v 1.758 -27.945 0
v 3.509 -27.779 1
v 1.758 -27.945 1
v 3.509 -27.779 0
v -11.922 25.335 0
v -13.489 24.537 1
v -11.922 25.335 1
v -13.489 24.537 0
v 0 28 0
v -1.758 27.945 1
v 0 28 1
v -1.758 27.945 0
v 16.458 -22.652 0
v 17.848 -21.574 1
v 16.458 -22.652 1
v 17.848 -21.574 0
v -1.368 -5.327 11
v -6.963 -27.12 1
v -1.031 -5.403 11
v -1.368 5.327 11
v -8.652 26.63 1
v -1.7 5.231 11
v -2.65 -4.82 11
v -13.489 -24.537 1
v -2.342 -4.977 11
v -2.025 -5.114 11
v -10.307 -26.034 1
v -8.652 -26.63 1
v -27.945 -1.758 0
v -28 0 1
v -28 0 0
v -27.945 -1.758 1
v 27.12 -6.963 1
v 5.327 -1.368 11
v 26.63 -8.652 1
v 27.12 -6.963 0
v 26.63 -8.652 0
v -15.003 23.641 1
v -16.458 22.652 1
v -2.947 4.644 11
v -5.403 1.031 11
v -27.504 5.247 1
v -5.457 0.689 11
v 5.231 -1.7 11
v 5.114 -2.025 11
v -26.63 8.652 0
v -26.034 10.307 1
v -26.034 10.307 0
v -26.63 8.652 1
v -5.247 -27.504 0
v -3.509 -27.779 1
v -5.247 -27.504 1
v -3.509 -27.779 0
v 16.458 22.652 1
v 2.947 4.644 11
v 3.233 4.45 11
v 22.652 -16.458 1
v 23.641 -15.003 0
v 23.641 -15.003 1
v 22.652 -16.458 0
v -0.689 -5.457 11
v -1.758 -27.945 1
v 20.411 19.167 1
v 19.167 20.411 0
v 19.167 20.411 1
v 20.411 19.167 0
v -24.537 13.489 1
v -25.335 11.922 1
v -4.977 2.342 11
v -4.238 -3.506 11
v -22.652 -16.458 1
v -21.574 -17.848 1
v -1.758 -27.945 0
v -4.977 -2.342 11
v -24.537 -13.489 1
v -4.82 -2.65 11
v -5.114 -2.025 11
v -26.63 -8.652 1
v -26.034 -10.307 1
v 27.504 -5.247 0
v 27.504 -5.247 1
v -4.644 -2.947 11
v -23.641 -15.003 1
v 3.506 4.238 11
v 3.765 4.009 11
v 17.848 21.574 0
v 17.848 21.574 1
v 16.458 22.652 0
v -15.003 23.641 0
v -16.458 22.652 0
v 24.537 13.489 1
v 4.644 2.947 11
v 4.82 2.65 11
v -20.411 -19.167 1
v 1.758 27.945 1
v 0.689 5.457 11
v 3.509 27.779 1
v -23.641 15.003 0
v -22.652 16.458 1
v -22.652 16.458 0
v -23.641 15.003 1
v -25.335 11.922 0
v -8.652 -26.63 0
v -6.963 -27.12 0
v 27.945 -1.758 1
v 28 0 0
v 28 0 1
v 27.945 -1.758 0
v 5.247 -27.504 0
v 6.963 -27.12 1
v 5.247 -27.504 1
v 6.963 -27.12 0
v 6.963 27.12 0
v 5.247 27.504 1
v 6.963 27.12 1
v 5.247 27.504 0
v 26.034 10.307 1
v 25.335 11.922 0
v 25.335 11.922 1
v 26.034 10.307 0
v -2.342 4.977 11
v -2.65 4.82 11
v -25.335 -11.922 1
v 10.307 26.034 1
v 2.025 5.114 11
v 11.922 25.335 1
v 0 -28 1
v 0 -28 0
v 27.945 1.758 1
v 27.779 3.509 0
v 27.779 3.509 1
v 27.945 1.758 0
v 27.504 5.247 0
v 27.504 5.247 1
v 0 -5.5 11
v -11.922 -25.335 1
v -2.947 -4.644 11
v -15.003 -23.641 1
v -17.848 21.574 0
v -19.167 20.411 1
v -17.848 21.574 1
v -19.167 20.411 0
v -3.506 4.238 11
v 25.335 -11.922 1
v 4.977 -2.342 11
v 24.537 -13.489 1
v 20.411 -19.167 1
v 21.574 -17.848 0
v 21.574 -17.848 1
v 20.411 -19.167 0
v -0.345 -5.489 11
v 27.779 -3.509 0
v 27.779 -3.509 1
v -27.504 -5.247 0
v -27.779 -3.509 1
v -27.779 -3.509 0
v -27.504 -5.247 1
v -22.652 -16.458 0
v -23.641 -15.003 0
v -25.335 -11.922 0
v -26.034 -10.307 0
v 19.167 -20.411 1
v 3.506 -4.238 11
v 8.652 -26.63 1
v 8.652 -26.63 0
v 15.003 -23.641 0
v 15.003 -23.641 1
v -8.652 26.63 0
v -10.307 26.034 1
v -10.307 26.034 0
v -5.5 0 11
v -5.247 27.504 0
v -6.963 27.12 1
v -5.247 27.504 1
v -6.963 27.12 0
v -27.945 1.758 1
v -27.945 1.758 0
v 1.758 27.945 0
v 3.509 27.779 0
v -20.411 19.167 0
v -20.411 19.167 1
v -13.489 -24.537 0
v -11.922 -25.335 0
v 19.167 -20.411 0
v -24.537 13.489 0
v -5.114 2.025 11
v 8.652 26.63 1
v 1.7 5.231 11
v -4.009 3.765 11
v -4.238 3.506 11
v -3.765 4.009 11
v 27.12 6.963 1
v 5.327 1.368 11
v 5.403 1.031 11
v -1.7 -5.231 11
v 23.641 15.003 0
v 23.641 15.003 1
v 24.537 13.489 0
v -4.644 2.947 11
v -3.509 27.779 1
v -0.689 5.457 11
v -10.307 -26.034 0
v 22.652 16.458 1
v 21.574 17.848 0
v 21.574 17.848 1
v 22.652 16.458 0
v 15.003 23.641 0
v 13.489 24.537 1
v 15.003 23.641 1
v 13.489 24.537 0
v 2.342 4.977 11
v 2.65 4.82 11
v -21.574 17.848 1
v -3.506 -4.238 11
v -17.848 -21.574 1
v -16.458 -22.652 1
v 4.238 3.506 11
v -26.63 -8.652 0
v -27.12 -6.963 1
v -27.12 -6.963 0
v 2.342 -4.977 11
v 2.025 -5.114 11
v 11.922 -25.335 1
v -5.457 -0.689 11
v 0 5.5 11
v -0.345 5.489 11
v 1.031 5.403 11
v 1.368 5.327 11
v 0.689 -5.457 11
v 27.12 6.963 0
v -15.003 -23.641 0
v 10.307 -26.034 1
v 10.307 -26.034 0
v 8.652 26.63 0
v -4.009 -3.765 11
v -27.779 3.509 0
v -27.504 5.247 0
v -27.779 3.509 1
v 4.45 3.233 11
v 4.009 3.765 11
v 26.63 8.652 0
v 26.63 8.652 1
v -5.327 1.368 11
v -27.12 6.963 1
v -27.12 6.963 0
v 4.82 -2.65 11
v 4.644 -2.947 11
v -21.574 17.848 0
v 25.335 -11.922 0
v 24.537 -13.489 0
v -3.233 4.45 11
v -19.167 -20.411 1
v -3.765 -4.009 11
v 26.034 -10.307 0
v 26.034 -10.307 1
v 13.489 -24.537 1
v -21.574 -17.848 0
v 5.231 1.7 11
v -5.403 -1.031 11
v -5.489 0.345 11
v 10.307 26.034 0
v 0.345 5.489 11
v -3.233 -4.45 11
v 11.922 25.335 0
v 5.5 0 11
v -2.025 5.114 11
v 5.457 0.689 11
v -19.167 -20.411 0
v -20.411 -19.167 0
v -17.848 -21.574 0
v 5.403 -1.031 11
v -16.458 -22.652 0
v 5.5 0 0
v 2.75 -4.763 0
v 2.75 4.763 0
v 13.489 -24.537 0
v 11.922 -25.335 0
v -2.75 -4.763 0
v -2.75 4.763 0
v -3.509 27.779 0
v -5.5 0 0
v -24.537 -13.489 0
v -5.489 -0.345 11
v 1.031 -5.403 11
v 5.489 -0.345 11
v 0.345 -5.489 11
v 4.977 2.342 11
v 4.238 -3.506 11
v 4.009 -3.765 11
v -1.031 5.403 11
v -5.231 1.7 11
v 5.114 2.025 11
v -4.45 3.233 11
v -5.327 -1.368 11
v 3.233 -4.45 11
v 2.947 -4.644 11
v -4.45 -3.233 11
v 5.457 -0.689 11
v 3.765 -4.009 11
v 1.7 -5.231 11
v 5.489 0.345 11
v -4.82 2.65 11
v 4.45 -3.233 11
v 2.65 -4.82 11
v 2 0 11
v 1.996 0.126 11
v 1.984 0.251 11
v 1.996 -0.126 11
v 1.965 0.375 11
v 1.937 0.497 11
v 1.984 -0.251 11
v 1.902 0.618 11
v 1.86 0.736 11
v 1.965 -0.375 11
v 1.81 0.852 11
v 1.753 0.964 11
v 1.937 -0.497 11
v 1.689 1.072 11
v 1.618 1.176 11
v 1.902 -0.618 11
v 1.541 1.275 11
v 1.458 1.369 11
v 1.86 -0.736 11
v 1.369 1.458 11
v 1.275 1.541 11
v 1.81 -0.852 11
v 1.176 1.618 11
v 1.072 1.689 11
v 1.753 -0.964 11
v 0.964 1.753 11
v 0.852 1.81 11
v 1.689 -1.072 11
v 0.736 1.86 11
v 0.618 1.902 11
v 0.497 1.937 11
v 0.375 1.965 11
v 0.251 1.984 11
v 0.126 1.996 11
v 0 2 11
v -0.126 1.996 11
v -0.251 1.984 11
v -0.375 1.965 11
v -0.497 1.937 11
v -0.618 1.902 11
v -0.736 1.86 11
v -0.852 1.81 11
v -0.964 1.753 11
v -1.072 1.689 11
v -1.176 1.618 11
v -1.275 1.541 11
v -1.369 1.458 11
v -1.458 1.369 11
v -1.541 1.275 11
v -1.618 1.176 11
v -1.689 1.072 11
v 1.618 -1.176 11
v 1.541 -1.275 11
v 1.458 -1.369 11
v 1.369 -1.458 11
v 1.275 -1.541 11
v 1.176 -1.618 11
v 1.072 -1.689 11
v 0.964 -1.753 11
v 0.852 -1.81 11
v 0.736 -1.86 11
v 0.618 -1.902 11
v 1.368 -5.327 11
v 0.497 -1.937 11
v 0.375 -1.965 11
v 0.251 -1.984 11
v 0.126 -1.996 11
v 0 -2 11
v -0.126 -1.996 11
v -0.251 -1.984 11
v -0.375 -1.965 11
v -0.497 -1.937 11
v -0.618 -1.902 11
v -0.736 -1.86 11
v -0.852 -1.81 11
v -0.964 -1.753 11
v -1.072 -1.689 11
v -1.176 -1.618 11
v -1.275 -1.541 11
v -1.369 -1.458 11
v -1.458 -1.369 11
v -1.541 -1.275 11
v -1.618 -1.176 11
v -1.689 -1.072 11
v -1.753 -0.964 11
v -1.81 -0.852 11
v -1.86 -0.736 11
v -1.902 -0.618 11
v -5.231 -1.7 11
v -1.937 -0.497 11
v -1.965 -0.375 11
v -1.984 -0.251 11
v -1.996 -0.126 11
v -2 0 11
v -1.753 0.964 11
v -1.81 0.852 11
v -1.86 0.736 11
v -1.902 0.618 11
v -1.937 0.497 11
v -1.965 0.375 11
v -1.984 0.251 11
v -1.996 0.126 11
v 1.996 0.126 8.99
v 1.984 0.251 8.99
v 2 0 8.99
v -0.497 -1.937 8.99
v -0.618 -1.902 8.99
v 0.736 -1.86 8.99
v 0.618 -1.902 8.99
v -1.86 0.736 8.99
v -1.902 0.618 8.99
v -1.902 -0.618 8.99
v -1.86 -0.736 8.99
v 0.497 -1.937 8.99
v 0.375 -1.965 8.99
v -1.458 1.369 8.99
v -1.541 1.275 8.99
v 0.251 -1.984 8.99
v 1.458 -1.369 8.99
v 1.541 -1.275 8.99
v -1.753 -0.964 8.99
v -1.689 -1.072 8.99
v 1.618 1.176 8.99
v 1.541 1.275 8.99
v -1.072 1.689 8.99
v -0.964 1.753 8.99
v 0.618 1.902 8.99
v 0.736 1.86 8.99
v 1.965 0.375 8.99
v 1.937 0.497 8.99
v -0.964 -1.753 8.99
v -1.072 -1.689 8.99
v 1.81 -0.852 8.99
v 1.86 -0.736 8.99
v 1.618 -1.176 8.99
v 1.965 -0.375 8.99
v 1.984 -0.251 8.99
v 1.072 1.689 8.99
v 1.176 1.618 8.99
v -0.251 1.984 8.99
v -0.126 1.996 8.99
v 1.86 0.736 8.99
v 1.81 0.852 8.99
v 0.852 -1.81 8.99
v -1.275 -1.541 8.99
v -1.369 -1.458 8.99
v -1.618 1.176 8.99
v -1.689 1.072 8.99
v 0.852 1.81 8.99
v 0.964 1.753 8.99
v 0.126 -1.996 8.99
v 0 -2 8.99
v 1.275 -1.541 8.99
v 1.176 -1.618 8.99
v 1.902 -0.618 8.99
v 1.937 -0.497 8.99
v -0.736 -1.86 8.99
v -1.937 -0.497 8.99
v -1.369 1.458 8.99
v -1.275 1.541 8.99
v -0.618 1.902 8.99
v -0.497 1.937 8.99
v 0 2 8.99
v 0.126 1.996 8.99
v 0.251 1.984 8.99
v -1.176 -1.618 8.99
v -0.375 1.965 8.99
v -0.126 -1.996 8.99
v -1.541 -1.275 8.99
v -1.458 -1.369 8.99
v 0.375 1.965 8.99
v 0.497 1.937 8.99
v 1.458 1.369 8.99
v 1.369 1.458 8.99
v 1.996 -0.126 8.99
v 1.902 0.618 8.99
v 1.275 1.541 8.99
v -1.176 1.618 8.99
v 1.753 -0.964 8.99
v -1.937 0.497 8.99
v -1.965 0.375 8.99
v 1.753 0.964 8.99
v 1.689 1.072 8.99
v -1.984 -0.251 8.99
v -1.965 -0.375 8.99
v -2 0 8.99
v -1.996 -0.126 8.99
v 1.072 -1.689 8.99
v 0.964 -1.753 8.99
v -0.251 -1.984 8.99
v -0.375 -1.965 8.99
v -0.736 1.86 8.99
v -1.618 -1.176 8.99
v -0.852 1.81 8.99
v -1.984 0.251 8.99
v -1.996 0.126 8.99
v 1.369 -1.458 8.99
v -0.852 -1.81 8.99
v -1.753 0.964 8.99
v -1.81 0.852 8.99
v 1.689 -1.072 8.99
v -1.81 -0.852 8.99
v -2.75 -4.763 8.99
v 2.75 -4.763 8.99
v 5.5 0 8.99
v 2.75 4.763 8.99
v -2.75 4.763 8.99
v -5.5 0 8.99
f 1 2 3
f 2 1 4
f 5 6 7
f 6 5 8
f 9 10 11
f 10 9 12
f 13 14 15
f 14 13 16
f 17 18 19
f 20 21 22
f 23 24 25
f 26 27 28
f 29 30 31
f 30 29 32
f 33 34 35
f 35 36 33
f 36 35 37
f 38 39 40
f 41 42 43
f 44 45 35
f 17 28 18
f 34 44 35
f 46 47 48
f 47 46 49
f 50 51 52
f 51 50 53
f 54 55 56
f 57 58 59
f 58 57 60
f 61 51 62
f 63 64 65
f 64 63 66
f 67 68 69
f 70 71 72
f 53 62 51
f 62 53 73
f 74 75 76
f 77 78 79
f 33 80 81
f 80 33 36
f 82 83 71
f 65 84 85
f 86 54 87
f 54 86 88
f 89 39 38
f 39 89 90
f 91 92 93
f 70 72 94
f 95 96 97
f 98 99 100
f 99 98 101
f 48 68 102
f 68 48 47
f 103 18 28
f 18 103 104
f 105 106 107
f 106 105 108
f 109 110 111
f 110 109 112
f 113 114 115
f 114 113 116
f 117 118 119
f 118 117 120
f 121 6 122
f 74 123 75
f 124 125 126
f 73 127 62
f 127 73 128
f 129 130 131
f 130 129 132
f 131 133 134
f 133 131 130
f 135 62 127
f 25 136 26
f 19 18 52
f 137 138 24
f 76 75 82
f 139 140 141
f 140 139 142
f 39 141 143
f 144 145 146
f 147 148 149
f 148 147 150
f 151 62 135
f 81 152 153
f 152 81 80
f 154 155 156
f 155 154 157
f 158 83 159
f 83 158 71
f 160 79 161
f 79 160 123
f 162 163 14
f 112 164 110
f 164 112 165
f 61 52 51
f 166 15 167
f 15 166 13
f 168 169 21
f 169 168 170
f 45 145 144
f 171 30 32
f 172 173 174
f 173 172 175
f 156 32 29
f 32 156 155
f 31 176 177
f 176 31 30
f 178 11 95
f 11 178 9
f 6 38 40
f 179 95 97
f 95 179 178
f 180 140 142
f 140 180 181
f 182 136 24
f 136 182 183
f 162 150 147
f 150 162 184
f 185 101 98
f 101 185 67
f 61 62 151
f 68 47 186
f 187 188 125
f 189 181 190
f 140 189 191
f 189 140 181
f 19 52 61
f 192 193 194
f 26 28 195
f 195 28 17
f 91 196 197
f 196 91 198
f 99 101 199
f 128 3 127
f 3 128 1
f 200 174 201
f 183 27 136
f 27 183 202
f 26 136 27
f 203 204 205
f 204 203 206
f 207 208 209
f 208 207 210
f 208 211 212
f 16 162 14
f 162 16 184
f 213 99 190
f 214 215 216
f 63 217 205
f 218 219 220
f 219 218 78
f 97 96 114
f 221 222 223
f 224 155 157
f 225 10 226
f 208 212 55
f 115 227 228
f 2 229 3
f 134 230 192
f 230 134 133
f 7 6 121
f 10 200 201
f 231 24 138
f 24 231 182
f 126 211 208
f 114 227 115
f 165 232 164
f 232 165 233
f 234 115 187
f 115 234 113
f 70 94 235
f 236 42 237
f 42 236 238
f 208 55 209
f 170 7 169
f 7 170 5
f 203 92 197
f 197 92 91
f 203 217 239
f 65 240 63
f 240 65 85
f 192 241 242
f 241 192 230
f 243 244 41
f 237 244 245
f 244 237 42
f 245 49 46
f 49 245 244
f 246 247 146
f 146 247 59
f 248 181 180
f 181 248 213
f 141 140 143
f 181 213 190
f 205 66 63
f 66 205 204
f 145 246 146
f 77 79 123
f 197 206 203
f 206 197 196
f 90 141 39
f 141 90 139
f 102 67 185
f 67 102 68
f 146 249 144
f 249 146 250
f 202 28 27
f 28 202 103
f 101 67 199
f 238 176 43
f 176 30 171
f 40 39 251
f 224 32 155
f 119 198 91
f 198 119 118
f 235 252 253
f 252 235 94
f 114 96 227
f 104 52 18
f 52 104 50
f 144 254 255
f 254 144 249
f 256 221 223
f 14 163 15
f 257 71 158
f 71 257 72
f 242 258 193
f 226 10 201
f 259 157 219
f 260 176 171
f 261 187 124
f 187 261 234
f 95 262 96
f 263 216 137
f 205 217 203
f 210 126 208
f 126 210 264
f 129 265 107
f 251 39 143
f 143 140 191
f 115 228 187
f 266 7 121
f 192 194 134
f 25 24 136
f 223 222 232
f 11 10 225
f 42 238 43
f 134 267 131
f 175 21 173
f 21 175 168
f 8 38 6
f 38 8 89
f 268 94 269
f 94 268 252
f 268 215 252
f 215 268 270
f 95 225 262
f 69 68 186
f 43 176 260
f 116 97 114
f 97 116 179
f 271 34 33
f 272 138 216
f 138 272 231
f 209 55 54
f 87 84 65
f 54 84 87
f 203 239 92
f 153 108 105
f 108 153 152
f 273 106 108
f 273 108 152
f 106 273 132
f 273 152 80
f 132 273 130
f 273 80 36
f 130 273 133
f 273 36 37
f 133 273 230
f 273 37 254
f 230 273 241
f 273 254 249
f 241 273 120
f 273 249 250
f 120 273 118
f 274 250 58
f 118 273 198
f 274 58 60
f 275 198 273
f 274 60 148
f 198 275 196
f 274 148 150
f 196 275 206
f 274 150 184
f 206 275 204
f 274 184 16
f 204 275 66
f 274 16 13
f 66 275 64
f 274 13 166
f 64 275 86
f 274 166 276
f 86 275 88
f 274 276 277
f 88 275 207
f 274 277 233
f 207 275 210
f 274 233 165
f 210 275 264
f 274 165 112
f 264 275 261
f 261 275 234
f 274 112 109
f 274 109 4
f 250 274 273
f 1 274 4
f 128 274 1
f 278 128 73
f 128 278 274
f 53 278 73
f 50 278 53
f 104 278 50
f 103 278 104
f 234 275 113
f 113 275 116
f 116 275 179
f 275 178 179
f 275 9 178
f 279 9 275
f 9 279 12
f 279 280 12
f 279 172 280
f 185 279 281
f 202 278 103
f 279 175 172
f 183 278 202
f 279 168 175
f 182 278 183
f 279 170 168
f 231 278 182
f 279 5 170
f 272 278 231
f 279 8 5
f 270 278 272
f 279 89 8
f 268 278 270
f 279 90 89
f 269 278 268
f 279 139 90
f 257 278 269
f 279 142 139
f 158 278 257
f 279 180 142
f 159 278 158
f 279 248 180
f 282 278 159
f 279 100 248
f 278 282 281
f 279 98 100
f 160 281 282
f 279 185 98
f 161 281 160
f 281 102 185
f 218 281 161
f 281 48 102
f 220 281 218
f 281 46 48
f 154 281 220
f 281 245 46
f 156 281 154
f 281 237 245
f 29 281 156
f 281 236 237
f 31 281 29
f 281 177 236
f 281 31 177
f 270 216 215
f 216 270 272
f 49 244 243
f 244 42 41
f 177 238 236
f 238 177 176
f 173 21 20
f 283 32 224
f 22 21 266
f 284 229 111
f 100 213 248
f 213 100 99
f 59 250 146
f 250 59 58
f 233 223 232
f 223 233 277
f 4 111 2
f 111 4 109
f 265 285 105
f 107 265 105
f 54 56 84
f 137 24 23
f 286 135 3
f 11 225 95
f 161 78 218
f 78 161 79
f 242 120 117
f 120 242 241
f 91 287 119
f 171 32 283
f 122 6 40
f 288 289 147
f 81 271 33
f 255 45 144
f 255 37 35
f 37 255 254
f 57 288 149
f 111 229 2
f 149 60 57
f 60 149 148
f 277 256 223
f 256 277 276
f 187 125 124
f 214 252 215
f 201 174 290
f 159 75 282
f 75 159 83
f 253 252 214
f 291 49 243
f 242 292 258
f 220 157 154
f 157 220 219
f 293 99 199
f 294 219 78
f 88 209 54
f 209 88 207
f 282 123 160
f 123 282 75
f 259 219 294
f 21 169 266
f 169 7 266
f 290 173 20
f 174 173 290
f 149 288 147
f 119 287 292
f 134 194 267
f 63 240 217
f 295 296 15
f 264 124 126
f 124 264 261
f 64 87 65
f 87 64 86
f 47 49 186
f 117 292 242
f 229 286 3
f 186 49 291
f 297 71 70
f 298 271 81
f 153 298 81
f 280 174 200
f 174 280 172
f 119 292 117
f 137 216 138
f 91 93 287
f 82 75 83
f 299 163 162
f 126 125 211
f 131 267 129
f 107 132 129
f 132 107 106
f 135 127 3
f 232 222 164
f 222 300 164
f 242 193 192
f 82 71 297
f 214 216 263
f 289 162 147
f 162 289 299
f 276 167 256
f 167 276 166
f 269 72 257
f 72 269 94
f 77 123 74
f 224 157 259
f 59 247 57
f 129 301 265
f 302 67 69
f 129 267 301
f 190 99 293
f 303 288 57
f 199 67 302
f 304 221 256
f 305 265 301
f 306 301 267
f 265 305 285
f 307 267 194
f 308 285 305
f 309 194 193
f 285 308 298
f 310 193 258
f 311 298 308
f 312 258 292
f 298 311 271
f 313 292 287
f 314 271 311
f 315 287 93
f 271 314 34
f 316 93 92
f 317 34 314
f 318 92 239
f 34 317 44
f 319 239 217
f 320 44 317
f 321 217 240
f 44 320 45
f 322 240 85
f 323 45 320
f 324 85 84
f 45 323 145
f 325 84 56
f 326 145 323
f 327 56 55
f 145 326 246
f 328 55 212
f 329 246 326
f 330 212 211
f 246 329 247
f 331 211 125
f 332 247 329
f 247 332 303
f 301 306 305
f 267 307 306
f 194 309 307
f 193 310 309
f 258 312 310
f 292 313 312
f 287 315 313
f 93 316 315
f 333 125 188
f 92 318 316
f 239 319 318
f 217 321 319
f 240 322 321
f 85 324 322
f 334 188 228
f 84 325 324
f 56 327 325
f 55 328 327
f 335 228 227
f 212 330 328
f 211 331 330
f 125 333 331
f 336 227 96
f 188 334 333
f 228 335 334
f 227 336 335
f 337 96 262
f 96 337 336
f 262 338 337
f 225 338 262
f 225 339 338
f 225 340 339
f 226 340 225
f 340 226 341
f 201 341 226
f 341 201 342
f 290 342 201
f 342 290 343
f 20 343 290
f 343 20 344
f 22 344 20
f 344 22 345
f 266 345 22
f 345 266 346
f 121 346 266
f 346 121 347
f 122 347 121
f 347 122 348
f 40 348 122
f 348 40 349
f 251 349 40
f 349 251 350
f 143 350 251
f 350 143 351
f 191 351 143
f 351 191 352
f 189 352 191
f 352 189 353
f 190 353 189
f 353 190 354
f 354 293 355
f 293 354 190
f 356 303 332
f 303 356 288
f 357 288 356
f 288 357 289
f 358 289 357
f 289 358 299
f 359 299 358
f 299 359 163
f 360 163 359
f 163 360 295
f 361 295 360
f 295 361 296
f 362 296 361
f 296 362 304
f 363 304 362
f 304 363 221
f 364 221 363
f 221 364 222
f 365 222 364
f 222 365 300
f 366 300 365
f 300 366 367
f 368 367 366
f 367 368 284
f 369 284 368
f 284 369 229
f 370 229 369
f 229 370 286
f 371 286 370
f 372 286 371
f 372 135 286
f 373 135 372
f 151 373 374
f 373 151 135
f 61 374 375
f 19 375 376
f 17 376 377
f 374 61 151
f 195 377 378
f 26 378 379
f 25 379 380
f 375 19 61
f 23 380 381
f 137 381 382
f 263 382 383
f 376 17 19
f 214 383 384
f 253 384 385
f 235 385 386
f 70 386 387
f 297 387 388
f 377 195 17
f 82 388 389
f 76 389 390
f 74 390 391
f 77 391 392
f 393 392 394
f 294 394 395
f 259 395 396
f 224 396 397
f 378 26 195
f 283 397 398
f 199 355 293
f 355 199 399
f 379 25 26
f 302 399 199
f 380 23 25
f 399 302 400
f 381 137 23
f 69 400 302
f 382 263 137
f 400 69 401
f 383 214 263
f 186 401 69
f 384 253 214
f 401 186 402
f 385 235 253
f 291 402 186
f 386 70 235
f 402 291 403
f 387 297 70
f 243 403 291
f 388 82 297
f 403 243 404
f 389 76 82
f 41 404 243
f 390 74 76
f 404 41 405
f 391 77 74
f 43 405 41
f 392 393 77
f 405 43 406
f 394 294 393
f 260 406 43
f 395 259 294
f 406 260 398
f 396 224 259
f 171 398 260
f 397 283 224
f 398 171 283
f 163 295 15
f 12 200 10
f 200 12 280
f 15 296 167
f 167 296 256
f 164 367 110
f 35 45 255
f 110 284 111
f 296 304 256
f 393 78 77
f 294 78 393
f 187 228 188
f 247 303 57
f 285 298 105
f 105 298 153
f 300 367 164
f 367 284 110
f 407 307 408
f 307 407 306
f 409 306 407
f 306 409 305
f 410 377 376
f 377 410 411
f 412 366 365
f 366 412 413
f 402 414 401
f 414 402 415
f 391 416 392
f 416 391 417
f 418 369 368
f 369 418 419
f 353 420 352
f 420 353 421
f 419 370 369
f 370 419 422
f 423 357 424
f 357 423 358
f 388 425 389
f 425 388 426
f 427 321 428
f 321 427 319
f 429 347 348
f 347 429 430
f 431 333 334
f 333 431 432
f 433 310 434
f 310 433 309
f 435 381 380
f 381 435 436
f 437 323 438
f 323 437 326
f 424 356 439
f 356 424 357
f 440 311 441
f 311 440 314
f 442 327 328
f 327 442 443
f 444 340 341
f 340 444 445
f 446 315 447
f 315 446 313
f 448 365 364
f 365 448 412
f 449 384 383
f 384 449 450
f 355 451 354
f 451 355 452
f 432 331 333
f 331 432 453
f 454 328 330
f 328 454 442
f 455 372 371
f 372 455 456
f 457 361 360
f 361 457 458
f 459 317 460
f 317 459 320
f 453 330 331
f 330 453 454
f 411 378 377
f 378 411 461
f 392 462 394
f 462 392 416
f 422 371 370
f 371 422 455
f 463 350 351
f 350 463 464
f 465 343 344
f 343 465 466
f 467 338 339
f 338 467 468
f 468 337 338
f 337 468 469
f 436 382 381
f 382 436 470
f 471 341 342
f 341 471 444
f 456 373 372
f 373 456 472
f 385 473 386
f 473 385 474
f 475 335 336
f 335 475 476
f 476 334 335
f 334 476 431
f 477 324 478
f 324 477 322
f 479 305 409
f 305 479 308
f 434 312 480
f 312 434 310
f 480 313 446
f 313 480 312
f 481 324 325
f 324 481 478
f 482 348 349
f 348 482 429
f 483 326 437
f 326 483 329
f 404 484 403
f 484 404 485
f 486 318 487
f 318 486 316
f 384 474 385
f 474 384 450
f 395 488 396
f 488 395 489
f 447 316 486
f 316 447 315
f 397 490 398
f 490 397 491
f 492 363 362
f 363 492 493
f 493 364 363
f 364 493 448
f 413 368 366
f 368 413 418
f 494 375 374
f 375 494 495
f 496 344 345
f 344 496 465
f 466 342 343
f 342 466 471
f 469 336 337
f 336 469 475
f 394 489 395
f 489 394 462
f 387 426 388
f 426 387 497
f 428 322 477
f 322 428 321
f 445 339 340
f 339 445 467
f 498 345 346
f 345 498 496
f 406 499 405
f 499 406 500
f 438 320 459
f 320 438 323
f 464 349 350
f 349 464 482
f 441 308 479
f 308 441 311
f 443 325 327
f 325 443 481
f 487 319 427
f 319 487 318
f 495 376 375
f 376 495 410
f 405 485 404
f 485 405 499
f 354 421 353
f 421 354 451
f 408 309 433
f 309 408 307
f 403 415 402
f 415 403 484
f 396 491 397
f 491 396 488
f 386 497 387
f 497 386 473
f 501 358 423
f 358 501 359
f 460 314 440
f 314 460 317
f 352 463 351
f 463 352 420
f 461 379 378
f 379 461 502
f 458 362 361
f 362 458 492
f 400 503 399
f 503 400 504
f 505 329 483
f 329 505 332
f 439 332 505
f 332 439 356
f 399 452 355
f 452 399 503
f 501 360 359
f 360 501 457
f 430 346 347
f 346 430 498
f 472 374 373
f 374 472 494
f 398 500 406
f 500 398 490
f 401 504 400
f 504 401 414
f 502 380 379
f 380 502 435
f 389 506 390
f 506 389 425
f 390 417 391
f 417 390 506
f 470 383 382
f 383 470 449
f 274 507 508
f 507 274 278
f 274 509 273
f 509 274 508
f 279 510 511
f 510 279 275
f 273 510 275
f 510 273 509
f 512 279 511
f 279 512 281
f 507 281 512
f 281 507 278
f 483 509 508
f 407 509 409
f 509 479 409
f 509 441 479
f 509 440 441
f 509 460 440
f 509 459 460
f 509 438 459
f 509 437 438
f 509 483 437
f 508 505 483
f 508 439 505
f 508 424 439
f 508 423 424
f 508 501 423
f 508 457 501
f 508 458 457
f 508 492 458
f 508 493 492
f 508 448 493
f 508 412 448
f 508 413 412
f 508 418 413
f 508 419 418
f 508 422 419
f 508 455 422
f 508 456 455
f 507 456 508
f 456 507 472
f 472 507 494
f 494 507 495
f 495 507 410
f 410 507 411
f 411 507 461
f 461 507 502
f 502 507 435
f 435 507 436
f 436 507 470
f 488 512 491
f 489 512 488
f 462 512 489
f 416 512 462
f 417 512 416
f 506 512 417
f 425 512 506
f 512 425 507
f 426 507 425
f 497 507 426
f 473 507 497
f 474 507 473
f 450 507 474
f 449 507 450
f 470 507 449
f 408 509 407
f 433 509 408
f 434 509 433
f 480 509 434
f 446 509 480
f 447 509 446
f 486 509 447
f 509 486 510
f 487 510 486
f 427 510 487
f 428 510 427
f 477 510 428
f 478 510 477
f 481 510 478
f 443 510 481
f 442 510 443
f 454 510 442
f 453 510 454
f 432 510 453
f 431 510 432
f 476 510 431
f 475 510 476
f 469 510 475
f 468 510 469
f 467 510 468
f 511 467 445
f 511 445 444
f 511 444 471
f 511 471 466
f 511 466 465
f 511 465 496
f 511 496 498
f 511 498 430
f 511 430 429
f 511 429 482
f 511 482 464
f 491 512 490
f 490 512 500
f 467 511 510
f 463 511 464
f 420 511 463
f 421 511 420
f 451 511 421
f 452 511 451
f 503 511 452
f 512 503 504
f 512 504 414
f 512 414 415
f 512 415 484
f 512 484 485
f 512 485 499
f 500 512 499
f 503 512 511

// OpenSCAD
$fn = 100;

$diameter = 56;
$thick = 10;
$nut_dia = 11;
$shaft_dia = 4;

difference(){
    hull(){
        linear_extrude(1)
        circle($diameter / 2);
        translate([0,0,$thick]){
            linear_extrude(1)
            circle($nut_dia/2);
        }
    }

    //shaft
    translate([0,0,-1])
    cylinder(h = $thick+3, r=$shaft_dia/2);
    
    //nut
    translate([0,0,-.01])
    cylinder(h = $thick-1, r=$nut_dia/2, $fn=6);
    
    //cutaway
    //translate([0,-50,-1])
    //cube([100,100,100]);
}
